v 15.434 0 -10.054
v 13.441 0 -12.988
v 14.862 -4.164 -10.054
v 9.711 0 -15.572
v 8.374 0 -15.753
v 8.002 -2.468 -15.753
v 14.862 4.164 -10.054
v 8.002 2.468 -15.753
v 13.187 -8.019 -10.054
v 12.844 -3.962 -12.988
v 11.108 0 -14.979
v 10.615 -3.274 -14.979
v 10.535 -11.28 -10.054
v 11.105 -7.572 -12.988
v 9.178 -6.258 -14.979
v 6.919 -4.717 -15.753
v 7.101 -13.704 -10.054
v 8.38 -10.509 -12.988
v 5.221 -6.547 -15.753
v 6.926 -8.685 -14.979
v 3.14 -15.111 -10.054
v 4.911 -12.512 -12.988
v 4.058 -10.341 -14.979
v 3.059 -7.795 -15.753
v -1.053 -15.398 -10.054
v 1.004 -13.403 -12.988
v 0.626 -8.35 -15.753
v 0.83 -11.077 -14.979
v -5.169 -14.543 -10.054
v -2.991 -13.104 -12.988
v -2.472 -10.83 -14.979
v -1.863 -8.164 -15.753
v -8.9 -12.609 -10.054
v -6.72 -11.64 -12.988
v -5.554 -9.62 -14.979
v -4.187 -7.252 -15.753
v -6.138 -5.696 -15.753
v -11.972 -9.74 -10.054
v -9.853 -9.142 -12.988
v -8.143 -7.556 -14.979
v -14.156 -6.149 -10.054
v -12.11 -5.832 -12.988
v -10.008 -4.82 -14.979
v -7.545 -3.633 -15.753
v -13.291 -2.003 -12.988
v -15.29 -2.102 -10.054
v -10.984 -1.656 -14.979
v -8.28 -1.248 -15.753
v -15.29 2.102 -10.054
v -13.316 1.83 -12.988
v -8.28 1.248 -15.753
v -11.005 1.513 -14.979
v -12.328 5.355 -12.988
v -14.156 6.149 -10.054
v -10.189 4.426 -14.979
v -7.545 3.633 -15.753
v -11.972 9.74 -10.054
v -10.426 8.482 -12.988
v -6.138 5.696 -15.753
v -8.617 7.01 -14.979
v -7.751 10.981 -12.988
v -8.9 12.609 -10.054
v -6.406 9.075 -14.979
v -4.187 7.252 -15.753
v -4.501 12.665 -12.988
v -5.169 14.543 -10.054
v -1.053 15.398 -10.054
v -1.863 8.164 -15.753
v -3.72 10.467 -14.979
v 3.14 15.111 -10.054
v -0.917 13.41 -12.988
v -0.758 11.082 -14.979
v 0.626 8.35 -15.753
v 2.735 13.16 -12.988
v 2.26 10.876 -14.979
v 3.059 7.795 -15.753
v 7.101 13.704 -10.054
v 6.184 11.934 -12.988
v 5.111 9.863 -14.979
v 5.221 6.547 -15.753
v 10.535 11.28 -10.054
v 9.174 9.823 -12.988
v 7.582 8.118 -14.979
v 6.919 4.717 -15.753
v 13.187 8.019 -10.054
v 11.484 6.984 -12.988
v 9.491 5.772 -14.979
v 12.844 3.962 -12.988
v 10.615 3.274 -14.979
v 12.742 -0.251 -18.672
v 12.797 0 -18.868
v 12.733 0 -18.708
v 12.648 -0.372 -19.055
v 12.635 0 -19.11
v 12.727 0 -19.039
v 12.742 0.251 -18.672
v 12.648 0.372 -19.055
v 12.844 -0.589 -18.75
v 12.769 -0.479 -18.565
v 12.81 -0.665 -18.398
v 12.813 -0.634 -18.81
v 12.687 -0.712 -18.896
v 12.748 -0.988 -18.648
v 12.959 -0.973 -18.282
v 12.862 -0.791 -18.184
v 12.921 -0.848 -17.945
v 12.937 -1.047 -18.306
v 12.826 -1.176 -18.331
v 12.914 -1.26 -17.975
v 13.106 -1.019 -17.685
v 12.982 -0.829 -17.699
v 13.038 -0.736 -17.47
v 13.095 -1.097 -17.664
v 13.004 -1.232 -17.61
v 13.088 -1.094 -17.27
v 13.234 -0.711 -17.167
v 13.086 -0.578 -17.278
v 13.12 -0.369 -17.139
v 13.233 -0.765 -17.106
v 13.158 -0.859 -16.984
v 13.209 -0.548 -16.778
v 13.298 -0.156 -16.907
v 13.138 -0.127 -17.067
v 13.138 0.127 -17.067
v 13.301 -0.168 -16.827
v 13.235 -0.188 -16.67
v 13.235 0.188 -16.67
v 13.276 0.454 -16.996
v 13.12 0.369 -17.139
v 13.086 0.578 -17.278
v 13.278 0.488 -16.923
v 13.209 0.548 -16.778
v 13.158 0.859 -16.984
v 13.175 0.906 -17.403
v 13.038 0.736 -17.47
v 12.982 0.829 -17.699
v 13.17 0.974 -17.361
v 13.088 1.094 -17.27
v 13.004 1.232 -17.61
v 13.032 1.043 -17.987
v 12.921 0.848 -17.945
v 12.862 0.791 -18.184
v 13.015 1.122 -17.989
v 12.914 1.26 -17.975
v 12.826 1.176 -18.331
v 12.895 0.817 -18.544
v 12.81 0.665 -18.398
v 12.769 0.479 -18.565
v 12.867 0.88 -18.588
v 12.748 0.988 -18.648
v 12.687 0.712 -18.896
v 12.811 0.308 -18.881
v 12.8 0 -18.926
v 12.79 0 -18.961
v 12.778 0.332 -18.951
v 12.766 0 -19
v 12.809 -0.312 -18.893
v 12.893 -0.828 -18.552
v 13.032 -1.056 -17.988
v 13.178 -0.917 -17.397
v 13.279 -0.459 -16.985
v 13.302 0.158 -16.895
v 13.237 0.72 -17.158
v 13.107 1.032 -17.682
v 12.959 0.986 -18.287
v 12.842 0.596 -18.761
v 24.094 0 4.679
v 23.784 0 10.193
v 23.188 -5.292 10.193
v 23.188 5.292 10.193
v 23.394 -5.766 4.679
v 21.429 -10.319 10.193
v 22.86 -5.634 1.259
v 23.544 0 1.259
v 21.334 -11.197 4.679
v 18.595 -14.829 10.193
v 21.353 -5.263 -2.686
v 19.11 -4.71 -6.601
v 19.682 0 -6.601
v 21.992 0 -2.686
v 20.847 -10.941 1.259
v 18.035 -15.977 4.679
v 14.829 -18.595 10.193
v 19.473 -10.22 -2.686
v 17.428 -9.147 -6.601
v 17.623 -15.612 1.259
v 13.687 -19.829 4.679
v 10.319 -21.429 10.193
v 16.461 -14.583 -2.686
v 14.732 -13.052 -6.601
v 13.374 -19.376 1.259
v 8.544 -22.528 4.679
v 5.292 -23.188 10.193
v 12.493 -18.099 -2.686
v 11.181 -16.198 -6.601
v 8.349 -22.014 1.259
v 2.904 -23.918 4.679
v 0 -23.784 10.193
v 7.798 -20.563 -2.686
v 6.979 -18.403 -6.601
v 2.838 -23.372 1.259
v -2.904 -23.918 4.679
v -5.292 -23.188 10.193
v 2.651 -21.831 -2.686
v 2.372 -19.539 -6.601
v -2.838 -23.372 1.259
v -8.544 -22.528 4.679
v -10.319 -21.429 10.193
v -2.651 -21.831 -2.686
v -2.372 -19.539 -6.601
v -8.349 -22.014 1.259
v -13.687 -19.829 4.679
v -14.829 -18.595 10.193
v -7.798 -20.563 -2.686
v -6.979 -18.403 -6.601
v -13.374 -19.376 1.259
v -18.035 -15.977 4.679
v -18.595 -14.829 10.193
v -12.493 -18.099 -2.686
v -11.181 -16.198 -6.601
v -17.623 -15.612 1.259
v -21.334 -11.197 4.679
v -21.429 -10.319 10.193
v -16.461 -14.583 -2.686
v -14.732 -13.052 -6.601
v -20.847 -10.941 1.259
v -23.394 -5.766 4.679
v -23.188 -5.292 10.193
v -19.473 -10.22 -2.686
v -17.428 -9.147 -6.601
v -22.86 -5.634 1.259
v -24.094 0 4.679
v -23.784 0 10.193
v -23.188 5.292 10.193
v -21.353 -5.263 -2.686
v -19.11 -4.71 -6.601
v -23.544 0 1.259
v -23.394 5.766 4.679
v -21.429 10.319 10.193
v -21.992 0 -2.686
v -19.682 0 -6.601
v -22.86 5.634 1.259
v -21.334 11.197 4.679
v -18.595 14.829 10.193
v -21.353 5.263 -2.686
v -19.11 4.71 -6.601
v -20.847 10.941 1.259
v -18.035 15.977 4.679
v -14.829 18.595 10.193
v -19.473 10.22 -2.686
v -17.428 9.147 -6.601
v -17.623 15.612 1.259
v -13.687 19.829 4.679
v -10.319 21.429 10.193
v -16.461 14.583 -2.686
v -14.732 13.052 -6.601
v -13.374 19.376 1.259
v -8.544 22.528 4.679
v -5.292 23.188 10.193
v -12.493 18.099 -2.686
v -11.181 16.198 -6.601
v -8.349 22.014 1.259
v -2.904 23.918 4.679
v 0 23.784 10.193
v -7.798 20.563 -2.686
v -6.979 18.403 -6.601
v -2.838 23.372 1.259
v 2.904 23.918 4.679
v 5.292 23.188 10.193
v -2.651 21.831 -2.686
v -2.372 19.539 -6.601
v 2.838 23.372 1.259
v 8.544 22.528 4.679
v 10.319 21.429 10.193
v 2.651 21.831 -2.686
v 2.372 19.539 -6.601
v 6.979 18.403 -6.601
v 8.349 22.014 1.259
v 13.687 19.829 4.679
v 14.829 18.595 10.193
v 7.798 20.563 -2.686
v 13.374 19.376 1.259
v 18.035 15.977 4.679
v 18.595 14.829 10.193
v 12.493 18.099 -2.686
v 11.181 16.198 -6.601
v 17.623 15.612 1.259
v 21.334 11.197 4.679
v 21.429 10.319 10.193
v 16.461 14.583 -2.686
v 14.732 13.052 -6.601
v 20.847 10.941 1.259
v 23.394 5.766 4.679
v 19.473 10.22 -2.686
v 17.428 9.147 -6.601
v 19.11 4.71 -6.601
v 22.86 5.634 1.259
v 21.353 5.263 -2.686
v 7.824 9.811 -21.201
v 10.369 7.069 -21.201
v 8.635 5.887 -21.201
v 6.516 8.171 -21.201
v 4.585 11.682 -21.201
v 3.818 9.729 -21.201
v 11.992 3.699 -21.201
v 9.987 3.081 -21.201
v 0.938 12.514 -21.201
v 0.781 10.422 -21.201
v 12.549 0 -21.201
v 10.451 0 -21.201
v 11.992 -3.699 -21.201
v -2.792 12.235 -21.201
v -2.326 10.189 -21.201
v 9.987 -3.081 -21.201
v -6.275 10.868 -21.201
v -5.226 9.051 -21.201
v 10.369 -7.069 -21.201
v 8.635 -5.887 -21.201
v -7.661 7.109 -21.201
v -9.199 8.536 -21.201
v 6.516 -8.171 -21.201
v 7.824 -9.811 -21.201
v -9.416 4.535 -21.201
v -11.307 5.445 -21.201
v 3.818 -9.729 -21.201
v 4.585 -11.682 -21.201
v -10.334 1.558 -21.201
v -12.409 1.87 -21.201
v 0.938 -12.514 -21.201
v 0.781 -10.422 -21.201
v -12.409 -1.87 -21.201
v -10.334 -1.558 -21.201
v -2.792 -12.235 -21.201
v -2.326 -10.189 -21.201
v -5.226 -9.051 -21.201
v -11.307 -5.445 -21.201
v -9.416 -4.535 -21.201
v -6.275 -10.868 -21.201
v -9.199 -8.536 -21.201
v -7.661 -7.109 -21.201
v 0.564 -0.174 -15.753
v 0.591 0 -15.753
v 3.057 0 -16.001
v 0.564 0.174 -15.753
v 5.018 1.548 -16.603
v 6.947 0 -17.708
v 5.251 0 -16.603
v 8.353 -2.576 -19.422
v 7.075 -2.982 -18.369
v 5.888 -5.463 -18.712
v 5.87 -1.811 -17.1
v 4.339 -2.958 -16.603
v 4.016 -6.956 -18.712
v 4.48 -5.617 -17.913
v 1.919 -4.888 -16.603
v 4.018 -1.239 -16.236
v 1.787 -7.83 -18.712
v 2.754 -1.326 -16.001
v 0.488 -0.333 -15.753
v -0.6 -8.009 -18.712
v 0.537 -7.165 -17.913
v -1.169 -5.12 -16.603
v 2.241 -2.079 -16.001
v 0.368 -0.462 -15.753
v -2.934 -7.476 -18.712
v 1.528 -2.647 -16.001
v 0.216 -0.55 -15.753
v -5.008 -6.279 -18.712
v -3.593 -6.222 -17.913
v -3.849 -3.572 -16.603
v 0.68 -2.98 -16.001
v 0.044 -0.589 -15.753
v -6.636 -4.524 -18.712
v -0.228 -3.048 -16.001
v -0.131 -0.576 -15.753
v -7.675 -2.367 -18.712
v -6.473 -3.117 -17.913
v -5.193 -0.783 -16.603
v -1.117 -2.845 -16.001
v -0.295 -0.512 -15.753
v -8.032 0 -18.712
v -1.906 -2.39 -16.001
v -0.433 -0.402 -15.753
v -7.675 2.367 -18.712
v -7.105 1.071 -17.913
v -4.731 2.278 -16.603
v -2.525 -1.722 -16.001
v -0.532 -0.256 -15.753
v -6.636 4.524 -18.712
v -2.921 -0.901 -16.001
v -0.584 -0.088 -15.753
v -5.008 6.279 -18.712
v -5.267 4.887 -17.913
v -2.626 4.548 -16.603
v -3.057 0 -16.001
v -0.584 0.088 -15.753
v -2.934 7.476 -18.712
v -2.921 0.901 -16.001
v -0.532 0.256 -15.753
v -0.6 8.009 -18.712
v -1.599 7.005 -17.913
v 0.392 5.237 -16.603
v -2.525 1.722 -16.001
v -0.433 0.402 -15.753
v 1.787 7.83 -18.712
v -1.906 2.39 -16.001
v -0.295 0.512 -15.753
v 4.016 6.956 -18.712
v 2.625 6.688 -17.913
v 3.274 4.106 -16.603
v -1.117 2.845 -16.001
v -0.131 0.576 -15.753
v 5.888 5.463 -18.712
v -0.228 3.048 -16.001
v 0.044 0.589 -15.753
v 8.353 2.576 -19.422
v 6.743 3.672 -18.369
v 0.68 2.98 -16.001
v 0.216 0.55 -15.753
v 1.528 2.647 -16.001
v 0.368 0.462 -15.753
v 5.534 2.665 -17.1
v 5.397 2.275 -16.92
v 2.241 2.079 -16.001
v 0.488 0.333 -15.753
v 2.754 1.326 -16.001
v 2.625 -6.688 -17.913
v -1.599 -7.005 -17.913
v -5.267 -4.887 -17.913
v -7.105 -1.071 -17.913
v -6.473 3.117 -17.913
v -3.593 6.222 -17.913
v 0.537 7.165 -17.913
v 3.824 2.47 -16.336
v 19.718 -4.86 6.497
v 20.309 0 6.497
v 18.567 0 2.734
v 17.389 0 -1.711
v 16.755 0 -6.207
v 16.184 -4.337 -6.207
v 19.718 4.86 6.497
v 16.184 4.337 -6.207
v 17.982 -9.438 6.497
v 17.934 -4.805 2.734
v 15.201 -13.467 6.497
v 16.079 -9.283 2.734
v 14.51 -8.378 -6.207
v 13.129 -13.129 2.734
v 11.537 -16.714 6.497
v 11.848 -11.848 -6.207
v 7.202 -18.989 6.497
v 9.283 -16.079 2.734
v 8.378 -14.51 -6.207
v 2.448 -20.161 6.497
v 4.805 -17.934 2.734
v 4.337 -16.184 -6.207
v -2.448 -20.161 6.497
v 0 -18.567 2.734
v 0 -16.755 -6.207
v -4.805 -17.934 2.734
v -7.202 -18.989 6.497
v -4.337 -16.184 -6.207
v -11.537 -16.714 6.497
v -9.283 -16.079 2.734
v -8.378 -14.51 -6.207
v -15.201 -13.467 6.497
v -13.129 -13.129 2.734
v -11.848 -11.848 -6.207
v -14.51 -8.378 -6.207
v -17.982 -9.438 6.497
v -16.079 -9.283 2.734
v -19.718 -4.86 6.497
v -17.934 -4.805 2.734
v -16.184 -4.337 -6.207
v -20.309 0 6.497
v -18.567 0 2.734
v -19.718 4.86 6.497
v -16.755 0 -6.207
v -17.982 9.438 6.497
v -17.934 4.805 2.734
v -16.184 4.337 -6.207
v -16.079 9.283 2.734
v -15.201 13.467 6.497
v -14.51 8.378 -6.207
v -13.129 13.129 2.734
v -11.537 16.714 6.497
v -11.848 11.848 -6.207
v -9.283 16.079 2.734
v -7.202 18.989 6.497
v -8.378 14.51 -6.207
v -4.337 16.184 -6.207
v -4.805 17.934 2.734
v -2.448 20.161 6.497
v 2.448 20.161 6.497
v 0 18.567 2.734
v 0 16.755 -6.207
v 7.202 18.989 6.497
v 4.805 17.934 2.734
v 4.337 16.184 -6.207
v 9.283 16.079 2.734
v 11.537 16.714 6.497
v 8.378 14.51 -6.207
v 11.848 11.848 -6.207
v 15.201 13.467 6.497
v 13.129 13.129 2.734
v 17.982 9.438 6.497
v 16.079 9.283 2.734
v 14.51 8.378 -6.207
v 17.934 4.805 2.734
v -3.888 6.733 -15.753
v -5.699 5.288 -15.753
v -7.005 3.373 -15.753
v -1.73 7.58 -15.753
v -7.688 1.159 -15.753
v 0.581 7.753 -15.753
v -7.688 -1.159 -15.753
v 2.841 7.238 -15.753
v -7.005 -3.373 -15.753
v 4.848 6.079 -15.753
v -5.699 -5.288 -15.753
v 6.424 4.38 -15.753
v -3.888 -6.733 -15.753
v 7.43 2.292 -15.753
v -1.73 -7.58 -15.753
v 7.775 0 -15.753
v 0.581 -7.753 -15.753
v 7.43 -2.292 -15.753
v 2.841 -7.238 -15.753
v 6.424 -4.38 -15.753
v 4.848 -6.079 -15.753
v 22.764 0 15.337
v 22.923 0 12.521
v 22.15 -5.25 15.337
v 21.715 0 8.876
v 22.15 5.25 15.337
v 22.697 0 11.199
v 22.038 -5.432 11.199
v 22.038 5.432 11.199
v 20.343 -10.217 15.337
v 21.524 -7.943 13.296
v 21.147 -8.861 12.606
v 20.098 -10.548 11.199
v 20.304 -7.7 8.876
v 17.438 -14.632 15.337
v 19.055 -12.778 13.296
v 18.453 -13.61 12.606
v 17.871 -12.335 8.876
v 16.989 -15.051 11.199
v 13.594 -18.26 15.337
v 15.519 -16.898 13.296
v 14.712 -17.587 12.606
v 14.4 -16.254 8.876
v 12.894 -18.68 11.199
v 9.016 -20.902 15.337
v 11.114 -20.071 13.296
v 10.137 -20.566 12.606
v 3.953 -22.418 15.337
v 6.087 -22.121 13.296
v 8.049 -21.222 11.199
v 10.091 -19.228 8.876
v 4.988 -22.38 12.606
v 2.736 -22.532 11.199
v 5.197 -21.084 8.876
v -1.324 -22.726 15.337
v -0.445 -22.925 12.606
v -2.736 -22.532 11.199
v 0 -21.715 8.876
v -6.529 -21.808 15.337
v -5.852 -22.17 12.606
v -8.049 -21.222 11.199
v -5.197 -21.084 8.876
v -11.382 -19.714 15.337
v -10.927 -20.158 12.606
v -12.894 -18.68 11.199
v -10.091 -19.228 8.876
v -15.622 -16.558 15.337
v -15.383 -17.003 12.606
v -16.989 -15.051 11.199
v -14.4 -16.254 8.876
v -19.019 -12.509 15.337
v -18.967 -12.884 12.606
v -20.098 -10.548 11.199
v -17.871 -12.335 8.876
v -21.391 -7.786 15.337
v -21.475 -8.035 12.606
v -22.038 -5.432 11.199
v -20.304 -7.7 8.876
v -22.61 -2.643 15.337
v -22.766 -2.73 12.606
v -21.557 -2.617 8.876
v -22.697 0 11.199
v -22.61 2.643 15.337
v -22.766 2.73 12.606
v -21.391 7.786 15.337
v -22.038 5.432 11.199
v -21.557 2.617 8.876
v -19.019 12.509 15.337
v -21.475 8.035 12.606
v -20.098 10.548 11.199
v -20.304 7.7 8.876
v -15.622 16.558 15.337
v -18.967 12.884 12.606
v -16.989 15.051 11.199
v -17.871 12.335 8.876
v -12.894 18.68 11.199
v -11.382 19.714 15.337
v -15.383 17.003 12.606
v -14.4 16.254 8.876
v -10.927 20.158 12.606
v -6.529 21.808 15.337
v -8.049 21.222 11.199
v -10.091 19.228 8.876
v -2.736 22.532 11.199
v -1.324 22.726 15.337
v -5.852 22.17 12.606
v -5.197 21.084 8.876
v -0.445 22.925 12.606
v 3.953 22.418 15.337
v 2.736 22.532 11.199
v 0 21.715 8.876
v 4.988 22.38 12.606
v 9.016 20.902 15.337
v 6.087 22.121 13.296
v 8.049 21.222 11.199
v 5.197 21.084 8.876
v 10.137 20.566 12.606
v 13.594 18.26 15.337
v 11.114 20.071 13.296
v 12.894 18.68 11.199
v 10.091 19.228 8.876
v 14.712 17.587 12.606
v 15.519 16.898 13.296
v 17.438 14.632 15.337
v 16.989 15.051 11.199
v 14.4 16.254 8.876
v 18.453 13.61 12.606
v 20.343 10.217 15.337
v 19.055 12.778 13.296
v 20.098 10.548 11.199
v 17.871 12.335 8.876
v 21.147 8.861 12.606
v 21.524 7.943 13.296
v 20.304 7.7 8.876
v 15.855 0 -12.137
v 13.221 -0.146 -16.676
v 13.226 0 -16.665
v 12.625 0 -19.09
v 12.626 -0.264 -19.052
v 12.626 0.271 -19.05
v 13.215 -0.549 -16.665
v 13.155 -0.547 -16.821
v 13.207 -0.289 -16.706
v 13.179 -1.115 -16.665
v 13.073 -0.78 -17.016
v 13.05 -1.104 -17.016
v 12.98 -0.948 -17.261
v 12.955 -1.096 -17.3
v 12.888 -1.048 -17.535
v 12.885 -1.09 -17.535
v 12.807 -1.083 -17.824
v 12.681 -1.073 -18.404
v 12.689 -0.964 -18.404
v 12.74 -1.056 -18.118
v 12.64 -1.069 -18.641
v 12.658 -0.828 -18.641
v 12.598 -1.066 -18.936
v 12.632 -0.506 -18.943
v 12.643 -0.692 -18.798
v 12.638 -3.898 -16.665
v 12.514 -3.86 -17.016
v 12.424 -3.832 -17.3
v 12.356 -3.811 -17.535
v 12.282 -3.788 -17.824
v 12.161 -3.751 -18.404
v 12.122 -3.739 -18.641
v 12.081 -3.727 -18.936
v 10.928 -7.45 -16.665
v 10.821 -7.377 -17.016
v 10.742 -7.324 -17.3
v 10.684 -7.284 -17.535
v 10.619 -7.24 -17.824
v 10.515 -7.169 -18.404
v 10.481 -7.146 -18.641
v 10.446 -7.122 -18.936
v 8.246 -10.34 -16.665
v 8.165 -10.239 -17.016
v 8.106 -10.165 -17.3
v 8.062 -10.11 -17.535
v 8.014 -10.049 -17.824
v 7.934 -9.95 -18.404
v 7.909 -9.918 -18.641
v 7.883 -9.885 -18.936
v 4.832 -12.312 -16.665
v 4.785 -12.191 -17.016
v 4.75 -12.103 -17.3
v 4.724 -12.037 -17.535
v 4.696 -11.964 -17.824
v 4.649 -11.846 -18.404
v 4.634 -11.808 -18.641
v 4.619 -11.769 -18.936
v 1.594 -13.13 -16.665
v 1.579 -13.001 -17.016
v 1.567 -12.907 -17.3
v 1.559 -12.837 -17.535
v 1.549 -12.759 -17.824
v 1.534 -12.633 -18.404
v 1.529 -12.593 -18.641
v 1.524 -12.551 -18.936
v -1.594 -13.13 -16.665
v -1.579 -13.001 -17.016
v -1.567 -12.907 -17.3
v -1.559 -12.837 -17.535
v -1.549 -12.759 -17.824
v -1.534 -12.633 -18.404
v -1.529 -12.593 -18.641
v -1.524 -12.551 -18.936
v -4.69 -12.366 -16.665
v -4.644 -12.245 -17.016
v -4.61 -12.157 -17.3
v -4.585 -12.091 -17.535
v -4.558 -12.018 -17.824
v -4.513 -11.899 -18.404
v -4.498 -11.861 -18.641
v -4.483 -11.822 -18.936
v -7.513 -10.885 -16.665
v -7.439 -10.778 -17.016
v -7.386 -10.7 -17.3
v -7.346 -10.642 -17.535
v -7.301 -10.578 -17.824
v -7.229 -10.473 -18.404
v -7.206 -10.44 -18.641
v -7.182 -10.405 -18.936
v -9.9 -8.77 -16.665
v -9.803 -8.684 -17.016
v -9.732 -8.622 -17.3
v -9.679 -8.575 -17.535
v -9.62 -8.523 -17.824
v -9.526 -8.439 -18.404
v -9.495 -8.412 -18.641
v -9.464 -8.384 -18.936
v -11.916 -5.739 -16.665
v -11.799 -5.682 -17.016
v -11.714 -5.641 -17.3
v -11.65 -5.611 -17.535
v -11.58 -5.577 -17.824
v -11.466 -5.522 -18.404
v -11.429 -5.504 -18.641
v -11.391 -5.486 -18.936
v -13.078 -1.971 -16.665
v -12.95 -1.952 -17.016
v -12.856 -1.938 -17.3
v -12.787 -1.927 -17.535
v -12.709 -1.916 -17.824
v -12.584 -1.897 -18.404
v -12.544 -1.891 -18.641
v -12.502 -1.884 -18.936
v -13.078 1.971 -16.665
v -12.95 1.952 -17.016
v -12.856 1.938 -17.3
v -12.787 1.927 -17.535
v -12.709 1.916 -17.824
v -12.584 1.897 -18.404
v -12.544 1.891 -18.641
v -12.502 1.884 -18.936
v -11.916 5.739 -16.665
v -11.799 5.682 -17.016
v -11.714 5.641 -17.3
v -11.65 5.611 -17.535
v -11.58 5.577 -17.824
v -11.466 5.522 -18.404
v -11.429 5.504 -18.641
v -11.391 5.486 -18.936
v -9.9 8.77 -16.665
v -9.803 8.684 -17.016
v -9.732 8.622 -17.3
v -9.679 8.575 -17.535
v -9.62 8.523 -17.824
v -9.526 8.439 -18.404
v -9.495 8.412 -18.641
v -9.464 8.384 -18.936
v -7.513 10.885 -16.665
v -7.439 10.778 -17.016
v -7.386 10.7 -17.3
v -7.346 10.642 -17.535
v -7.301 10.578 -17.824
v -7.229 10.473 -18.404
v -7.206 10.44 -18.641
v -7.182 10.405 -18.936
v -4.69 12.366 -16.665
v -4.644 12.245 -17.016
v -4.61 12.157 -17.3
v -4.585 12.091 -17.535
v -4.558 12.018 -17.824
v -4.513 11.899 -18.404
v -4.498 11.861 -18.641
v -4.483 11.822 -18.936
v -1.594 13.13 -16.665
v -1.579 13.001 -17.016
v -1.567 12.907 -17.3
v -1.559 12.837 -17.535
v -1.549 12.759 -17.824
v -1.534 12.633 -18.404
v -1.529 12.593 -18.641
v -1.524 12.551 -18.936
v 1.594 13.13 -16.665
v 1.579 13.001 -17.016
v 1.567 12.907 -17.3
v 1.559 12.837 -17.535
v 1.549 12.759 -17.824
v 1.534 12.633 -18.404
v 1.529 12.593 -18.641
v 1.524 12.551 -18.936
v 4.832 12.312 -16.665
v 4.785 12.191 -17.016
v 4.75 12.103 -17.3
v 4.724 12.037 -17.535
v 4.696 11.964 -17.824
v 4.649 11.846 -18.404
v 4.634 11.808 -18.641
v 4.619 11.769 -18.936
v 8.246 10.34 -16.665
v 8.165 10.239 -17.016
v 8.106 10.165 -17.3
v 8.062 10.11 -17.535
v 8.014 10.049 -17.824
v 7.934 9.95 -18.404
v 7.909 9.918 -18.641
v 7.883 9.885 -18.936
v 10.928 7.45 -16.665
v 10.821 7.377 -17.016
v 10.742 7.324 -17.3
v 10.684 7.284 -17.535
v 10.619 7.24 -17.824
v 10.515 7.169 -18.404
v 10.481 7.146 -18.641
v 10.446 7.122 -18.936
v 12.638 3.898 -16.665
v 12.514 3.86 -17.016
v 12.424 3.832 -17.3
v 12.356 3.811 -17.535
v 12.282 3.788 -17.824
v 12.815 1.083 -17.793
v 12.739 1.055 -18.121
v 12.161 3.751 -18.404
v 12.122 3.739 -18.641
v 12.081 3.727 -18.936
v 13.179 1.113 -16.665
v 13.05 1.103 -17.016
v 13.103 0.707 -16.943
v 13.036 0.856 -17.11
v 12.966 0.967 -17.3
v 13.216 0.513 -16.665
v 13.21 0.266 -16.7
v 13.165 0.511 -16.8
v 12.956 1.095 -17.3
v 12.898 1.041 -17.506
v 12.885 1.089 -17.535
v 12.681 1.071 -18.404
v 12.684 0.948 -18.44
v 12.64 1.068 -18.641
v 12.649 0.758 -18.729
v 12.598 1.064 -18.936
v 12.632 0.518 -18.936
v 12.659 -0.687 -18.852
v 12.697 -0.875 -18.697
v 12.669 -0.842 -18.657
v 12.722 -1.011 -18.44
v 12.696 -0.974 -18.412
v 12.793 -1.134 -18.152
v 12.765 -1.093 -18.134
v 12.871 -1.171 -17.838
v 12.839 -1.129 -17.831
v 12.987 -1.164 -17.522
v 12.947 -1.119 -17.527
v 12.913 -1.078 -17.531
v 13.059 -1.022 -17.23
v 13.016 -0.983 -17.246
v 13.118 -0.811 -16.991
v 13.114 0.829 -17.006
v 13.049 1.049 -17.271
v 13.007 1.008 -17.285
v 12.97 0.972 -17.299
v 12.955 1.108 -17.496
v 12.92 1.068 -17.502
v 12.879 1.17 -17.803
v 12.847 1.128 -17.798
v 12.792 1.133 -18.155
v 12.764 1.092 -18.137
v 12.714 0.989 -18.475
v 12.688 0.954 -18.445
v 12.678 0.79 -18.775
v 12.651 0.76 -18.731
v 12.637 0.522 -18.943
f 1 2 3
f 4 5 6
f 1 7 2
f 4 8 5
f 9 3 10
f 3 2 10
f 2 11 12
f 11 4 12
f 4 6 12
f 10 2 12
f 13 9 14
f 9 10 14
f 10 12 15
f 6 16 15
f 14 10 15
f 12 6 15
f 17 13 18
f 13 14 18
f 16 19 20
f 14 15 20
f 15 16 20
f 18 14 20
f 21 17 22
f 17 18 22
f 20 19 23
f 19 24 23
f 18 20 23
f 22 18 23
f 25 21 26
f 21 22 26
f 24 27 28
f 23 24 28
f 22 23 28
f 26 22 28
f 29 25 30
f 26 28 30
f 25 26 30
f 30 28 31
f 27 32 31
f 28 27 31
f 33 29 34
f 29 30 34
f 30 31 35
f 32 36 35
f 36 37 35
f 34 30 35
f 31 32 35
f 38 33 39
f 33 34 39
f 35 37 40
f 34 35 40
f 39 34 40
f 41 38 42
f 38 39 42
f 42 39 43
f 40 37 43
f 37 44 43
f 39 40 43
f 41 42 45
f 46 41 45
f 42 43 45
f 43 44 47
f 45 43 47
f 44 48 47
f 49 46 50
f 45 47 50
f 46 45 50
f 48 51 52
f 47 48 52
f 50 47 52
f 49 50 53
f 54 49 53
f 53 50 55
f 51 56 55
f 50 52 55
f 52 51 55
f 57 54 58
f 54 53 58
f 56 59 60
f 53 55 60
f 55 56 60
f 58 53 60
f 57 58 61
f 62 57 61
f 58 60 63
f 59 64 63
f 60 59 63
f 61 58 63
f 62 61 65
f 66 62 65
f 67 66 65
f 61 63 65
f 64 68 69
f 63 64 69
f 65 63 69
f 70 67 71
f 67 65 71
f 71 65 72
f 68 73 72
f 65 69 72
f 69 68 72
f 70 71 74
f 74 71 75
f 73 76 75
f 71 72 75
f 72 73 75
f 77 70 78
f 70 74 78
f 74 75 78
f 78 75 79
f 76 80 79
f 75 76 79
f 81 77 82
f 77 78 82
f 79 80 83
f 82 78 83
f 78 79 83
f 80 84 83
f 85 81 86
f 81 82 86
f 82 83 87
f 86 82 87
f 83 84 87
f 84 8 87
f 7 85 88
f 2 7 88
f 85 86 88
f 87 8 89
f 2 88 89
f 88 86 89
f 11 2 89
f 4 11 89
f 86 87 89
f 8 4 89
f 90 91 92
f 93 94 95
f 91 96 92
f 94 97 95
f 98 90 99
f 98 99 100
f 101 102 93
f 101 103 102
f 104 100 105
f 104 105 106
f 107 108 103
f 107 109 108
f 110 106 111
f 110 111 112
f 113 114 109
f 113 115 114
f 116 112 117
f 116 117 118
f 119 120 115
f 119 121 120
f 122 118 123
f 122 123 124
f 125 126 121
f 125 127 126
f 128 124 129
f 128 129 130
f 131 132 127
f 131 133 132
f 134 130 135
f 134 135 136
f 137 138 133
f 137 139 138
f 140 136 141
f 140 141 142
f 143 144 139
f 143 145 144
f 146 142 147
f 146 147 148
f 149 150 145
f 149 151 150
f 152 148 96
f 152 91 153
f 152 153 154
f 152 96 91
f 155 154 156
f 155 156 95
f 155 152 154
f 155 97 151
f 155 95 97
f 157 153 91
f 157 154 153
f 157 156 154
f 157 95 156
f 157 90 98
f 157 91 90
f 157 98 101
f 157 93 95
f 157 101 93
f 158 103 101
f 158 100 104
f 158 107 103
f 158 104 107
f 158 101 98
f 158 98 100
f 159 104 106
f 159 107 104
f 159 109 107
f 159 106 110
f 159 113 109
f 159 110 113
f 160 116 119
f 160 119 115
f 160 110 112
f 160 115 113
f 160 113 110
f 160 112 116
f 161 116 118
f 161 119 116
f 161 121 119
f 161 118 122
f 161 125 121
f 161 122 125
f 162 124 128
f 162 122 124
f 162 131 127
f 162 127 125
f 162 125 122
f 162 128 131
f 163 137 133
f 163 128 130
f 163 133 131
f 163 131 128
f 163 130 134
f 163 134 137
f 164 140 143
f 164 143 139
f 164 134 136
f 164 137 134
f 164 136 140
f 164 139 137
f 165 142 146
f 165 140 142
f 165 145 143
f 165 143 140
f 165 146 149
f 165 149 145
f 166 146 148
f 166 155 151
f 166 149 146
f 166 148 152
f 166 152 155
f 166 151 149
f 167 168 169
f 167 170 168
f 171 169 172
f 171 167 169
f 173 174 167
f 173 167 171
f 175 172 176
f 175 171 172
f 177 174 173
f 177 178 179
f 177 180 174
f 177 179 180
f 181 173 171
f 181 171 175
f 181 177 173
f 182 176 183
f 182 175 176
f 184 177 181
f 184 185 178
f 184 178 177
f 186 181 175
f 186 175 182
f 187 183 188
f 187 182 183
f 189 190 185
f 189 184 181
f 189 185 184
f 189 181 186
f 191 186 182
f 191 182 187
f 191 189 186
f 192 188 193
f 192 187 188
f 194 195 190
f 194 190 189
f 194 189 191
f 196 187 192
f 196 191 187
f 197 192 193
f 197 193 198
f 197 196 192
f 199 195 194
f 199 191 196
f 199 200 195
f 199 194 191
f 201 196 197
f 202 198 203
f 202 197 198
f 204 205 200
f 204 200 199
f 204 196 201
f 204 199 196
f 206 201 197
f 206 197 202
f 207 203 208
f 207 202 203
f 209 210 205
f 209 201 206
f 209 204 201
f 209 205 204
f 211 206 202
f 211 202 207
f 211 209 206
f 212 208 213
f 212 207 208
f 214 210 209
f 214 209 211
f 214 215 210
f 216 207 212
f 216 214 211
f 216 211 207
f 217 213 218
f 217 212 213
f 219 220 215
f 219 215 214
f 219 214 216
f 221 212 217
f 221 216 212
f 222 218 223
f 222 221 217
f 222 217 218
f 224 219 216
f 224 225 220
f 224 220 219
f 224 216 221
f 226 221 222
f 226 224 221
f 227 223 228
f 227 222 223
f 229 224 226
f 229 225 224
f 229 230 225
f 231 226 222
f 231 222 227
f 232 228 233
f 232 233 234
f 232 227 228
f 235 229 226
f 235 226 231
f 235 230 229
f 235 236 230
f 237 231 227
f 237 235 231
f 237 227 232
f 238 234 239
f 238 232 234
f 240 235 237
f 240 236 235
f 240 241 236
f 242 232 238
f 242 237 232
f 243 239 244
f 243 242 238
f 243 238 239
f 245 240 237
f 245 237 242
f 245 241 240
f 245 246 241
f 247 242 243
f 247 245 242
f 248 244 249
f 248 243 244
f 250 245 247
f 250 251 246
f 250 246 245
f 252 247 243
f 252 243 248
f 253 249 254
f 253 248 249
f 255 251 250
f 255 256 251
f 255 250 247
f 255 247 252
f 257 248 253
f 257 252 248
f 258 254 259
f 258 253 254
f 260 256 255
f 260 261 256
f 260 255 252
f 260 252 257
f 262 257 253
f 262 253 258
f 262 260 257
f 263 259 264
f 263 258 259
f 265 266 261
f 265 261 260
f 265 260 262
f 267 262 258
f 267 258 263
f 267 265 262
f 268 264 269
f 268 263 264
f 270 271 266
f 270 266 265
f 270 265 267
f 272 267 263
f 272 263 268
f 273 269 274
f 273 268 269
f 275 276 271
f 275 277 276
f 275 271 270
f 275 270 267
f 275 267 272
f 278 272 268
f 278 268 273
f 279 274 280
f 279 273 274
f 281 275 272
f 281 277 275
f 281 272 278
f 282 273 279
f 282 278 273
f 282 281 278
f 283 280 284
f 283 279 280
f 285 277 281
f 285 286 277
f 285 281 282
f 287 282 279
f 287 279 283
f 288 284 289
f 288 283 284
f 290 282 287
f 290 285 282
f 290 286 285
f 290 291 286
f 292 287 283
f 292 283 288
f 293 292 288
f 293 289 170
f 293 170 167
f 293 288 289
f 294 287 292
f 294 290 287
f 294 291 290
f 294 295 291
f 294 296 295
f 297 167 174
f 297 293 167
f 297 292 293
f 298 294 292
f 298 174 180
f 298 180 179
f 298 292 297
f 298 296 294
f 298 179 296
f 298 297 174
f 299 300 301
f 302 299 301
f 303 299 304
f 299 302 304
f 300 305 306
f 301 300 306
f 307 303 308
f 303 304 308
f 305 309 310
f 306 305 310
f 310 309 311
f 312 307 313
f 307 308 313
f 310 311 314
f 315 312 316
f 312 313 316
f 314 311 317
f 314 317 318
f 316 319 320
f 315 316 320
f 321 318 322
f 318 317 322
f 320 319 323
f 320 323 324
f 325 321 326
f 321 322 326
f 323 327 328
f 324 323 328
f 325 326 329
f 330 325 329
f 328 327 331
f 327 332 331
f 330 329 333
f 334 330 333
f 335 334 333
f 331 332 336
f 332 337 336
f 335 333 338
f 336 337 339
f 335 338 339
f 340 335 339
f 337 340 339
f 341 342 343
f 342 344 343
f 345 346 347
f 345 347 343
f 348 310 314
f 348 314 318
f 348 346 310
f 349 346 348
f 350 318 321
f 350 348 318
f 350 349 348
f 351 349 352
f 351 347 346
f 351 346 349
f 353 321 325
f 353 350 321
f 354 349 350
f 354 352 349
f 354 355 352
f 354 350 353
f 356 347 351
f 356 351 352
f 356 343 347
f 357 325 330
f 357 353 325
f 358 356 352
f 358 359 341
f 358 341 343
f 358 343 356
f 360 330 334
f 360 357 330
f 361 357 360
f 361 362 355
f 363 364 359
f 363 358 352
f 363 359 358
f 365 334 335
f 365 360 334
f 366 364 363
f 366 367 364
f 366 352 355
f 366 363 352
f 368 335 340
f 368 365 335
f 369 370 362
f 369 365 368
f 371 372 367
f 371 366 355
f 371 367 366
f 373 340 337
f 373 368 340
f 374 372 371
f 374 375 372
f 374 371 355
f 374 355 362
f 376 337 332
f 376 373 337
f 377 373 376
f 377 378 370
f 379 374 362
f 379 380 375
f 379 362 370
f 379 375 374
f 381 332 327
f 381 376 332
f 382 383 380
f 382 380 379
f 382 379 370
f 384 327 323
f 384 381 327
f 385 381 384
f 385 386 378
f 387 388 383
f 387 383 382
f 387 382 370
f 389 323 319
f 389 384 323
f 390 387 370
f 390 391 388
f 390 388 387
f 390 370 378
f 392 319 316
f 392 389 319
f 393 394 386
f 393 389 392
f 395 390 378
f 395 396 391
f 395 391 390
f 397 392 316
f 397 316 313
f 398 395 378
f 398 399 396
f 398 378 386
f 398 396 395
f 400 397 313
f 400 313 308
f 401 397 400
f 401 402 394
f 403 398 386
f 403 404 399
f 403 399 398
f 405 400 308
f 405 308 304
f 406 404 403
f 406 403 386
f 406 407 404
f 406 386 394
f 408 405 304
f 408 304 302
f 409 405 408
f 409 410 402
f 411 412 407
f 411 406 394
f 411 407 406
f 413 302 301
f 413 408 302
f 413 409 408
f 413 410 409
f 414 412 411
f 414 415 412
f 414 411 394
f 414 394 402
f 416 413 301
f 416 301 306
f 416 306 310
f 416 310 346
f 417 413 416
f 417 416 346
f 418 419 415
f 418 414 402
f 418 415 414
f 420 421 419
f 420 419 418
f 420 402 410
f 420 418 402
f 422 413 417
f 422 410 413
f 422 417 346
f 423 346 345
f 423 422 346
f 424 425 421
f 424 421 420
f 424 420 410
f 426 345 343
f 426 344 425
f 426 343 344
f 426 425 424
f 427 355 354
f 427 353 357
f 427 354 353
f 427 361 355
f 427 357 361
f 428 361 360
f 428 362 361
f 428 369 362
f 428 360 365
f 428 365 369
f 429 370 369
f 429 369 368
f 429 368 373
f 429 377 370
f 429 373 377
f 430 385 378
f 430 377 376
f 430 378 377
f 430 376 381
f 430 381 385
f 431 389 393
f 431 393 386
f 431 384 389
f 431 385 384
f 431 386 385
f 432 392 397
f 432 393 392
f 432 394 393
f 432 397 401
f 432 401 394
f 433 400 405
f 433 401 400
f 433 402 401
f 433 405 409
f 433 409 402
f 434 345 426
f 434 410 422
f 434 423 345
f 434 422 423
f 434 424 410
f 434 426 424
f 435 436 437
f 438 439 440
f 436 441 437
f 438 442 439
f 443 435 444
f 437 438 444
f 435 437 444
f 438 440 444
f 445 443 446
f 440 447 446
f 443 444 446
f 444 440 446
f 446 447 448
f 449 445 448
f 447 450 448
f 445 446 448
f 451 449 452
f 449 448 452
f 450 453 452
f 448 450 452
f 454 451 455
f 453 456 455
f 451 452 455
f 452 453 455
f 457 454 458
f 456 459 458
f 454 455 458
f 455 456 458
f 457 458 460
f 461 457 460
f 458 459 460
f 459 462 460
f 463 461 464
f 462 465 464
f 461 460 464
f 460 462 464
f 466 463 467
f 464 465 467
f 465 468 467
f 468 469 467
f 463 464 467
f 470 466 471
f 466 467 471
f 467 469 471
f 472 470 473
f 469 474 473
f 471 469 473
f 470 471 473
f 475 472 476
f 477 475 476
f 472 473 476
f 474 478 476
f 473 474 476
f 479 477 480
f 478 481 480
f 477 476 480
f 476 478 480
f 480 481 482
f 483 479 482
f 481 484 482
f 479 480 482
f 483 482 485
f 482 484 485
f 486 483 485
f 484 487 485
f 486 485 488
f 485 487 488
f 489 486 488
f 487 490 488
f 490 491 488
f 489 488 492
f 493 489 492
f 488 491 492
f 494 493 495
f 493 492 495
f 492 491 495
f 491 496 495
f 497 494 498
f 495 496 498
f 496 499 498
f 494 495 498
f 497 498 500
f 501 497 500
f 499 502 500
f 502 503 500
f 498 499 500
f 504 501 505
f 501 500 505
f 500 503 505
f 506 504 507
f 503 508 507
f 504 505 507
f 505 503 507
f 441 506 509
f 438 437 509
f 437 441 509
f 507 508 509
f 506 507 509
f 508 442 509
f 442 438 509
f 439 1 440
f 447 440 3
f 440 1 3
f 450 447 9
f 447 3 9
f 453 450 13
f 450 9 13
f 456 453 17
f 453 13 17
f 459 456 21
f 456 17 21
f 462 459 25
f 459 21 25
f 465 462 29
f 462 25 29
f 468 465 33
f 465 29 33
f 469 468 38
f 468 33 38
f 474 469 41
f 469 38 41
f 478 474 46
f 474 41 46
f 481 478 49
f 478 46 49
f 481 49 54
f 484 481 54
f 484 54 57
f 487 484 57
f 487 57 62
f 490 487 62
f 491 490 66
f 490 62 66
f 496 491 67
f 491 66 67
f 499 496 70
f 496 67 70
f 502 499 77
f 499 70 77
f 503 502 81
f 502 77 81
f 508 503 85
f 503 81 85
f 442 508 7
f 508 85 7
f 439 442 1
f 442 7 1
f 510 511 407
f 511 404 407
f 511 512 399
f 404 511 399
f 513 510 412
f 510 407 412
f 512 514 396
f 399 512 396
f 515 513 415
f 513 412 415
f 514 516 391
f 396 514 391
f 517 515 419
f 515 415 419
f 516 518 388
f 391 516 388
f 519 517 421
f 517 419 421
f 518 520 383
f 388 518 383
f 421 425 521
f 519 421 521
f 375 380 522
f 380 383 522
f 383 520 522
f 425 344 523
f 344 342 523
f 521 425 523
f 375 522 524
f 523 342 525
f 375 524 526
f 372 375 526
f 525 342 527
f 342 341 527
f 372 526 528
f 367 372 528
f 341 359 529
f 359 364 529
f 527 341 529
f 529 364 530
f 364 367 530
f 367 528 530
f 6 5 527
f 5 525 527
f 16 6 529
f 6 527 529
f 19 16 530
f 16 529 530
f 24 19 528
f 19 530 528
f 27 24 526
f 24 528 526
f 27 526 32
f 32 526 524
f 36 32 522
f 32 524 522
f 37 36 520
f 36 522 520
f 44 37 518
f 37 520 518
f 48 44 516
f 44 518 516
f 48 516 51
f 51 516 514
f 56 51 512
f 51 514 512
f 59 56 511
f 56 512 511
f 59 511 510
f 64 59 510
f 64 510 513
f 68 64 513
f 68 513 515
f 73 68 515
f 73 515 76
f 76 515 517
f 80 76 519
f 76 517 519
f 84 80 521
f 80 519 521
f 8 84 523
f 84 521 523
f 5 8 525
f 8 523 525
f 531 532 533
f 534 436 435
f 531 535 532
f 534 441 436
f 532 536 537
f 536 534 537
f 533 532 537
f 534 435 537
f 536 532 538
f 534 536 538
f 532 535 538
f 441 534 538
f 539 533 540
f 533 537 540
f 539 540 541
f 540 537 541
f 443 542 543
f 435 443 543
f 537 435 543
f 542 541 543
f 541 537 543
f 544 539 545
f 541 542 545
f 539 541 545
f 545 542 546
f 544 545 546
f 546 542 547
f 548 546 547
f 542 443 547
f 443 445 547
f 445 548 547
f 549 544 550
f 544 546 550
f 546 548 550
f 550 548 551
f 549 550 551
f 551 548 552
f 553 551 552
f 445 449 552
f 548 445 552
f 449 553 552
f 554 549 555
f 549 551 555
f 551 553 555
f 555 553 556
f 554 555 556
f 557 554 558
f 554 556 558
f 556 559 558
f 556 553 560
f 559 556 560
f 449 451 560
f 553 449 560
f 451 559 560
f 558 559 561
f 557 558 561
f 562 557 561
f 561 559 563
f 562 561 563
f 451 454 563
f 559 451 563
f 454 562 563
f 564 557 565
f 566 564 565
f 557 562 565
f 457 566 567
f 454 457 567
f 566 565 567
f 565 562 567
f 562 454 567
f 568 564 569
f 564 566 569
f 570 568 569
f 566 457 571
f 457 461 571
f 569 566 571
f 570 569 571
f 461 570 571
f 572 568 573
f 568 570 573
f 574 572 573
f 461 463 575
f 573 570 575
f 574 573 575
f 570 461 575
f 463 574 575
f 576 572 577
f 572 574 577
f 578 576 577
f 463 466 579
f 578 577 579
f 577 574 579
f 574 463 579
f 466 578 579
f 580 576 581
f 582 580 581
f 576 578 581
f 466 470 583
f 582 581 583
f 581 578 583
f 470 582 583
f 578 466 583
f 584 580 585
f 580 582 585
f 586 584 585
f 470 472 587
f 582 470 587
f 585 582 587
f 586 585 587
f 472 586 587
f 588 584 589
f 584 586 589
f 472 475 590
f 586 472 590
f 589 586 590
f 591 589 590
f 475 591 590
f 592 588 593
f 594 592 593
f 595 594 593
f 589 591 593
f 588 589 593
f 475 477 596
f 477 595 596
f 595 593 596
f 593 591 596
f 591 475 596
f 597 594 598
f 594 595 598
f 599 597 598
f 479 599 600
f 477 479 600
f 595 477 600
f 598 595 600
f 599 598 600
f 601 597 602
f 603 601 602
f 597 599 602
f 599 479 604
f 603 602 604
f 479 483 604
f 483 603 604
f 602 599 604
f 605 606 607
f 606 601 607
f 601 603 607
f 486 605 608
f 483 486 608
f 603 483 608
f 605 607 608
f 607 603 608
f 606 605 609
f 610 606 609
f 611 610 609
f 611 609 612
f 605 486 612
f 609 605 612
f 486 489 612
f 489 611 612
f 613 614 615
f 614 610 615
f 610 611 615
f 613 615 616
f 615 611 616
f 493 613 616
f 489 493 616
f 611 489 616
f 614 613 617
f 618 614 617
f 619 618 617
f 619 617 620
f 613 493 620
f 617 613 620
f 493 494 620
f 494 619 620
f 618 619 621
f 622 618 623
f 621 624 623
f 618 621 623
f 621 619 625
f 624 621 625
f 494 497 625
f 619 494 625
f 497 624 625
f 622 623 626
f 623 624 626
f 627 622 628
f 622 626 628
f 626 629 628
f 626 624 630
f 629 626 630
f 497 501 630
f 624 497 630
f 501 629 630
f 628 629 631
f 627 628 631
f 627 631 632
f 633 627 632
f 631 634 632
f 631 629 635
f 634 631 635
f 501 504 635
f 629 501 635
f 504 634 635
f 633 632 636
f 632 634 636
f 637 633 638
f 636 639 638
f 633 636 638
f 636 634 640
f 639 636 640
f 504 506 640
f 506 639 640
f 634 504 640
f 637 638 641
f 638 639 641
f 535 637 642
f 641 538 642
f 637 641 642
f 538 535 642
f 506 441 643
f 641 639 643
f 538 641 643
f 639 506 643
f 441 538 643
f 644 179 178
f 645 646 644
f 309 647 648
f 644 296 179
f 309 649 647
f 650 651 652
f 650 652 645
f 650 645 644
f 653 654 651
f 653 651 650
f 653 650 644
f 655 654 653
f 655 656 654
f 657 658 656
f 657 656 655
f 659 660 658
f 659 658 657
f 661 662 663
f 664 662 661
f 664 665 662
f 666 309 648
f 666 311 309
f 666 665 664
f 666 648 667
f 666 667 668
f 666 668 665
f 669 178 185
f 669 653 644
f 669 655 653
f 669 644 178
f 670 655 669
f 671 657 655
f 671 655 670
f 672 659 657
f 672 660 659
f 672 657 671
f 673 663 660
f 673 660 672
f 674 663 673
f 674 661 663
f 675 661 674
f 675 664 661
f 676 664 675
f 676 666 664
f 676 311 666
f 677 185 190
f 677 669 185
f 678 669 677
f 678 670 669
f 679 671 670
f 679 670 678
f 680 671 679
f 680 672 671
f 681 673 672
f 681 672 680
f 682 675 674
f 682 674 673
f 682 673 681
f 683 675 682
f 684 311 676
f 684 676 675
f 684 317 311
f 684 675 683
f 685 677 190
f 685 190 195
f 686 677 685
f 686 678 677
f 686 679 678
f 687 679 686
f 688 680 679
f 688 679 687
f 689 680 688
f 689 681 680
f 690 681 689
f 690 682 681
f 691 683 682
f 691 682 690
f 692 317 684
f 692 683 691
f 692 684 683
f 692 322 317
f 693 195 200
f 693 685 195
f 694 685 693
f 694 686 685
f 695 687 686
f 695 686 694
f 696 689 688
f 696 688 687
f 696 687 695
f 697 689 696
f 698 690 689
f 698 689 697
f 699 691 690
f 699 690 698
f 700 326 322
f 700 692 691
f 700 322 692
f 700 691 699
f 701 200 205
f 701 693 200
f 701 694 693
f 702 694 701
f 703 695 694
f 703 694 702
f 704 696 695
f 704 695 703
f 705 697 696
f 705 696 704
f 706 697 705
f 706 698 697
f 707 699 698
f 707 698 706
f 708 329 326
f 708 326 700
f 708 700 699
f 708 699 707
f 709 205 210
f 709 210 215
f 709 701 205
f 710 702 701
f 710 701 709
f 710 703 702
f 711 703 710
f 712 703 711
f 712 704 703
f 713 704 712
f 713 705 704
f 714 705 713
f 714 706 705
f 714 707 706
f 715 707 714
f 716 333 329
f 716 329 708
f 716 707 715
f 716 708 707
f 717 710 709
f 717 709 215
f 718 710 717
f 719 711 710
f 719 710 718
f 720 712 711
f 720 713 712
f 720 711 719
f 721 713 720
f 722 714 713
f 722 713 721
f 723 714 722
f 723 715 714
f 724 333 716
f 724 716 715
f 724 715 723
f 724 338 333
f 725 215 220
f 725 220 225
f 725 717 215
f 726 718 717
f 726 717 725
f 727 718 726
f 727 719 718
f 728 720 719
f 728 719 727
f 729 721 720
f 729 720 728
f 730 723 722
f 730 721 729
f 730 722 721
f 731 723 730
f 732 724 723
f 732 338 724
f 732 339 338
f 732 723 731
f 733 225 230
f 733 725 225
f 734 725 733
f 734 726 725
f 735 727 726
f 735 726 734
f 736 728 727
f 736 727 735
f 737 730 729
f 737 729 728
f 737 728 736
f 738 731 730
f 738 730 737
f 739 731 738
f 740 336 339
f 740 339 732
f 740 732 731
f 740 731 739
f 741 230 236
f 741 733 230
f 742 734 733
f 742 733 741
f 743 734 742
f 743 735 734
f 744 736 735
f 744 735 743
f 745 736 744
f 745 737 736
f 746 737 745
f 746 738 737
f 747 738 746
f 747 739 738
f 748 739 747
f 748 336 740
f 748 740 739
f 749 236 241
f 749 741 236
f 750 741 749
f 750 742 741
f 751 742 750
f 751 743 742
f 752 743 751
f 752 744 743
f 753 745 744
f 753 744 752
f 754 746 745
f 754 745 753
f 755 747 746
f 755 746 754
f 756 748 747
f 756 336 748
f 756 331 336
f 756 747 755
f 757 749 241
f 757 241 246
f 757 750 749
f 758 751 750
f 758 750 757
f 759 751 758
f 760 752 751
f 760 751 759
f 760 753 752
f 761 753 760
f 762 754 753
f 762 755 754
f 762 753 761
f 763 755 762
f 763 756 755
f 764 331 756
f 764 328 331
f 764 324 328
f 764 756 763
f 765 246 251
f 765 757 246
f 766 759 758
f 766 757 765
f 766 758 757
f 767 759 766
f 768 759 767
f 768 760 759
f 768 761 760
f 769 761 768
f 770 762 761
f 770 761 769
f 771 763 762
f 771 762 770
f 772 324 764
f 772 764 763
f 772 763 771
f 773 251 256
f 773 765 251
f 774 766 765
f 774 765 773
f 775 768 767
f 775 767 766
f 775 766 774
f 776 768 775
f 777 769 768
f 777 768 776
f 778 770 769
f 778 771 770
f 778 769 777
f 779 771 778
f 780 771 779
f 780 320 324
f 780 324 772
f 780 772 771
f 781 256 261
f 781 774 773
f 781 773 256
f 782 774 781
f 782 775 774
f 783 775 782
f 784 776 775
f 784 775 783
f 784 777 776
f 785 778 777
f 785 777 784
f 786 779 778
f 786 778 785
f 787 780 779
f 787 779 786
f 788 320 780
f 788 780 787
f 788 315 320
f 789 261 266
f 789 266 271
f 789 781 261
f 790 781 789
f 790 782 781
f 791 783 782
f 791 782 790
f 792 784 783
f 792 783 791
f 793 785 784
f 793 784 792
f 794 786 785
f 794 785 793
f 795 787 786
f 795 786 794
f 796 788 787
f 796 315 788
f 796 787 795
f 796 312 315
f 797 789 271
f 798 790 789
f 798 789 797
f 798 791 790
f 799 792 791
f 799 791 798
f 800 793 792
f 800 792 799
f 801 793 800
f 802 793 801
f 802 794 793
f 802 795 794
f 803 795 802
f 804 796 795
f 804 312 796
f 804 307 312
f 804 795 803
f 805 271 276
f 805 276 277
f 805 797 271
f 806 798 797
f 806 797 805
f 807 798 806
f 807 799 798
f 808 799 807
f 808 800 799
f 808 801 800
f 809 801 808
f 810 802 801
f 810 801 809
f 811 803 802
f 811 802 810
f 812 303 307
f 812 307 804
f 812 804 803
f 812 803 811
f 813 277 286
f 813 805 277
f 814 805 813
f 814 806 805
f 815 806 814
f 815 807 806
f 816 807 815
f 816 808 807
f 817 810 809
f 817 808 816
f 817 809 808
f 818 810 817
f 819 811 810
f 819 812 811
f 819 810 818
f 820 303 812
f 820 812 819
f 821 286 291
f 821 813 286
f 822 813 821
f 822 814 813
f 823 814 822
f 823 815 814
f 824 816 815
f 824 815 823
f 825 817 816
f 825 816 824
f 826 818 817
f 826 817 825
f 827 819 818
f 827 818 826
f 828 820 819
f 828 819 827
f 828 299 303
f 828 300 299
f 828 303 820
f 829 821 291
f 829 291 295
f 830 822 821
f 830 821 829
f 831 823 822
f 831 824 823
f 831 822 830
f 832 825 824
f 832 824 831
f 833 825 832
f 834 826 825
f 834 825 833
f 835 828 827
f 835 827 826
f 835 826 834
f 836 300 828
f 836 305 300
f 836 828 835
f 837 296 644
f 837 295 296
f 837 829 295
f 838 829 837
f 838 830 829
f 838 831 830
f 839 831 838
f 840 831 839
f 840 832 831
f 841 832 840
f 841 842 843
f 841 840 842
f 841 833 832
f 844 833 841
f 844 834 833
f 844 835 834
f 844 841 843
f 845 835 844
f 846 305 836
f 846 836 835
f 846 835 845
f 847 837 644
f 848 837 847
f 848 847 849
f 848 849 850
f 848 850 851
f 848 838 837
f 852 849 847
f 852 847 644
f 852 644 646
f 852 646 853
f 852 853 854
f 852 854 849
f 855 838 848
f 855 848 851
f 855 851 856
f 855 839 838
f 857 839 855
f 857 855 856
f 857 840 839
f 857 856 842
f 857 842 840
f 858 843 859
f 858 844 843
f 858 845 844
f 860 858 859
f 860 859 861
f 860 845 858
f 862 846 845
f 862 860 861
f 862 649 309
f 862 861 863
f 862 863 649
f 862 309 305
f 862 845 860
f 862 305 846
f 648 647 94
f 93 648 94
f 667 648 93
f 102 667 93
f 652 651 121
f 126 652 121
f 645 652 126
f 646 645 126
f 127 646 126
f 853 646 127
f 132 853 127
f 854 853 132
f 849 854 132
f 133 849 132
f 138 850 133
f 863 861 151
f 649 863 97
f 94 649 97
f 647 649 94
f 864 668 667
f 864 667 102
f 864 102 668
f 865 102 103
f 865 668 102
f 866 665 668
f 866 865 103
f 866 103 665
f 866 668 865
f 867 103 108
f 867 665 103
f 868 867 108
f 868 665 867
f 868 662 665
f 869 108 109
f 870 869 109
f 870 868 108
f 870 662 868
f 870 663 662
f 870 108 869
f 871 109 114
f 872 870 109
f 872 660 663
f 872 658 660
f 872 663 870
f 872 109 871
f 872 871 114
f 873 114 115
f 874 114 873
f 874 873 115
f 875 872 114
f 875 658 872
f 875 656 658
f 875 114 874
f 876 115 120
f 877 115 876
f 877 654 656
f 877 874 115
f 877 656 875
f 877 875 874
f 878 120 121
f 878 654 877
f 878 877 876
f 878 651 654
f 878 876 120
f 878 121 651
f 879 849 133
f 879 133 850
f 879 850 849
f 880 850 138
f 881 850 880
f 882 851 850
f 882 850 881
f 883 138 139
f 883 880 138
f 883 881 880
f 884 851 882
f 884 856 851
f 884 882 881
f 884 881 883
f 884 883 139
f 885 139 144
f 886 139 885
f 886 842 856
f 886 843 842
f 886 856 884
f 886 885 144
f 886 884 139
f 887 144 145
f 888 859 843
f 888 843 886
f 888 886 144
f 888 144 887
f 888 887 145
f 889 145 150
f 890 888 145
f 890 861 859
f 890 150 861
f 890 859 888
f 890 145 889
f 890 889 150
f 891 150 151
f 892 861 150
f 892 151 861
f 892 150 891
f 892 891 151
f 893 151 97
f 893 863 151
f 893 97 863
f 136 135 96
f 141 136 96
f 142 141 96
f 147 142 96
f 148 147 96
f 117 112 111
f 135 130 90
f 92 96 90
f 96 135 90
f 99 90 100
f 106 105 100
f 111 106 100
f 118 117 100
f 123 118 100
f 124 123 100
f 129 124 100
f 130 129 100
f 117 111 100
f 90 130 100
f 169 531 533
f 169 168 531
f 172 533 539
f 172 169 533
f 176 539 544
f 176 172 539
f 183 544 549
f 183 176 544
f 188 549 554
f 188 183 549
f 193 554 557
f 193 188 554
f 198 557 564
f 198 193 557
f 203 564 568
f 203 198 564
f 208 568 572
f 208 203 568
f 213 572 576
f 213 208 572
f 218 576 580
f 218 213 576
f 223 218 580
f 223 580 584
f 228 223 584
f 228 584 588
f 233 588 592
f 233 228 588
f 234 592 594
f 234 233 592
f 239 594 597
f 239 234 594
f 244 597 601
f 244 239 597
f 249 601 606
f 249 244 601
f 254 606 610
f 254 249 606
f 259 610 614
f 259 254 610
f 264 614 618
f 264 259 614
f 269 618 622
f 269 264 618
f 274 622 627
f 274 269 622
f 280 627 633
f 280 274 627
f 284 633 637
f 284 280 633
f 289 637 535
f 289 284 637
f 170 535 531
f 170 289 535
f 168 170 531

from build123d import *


with BuildPart() as f1:
    # F0 (on Front) → F1 (revolve)
    with BuildSketch(Plane.XZ):
        with BuildLine():
            add(Edge.make_bspline(
                [(19.6823217034, -6.6014872209), (18.7206290933, -7.4863491309), (17.5676079465, -8.5412161557), (16.6606779031, -9.2215613008), (16.5172192351, -9.3254513944)],
                knots=[0, 0, 0, 0, 0.5821747808, 0.6959078834, 0.6959078834, 0.6959078834, 0.6959078834], degree=3))
            add(Edge.make_bspline(
                [(23.7838823749, 10.1932772593), (24.2970848929, 6.840613956), (24.4178453084, 1.3242383799), (21.093212182, -4.4477596725), (19.6823217034, -6.6014872209)],
                knots=[0.1255407693, 0.1255407693, 0.1255407693, 0.1255407693, 0.3707684145, 0.5266538311, 0.5266538311, 0.5266538311, 0.5266538311], degree=3))
            add(Edge.make_bspline(
                [(23.7838823557, 10.1932772629), (22.5530164904, 9.153802728), (21.3274805944, 8.1001474), (20.3086007386, 6.497125607)],
                knots=[0.0071128484, 0.0071128484, 0.0071128484, 0.0071128484, 0.27405021, 0.27405021, 0.27405021, 0.27405021], degree=3))
            add(Edge.make_bspline(
                [(20.3086007386, 6.497125607), (18.9438893572, 4.3500009258), (17.4757524028, -0.2772106808), (16.8935087075, -4.7649402342), (16.755240937, -6.2066463042)],
                knots=[0.27405021, 0.27405021, 0.27405021, 0.27405021, 0.6315923221, 0.8021612393, 0.8021612393, 0.8021612393, 0.8021612393], degree=3))
            add(Edge.make_bspline(
                [(16.755240937, -6.2066463042), (16.6552314343, -7.2494367288), (16.5812677523, -8.2881791115), (16.5172192351, -9.3254513944)],
                knots=[0.8021612393, 0.8021612393, 0.8021612393, 0.8021612393, 0.9255342605, 0.9255342605, 0.9255342605, 0.9255342605], degree=3))
        make_face()
        with BuildLine():
            add(Edge.make_bspline(
                [(19.6823217034, -6.6014872209), (17.4171980587, -10.0592036547), (12.5537292031, -16.1629021911), (12.5385838339, -19.5460692495), (12.5492885709, -21.20067738)],
                knots=[0.5266538311, 0.5266538311, 0.5266538311, 0.5266538311, 0.7769211256, 1, 1, 1, 1], degree=3))
            add(Edge.make_bspline(
                [(19.6823217034, -6.6014872209), (18.7206290933, -7.4863491309), (17.5676079465, -8.5412161557), (16.6606779031, -9.2215613008), (16.5172192351, -9.3254513944)],
                knots=[0, 0, 0, 0, 0.5821747808, 0.6959078834, 0.6959078834, 0.6959078834, 0.6959078834], degree=3))
            add(Edge.make_bspline(
                [(16.5172192351, -9.3254513944), (16.1336488497, -9.6032259185), (15.7841216901, -9.8288168601), (15.4340223068, -10.0539055119)],
                knots=[0.6959078834, 0.6959078834, 0.6959078834, 0.6959078834, 1, 1, 1, 1], degree=3))
            add(Edge.make_bspline(
                [(15.4340223068, -10.0539055119), (15.2801119472, -10.3720102908), (14.1971702129, -12.3893155375), (11.3362161193, -15.3503692976), (9.1659848619, -15.7282313026), (8.3738614299, -15.7529823482)],
                knots=[0.281908143, 0.281908143, 0.281908143, 0.281908143, 0.3519178239, 0.7265638945, 0.9449180046, 0.9449180046, 0.9449180046, 0.9449180046], degree=3))
            add(Edge.make_bspline(
                [(8.3738614299, -15.7529823482), (8.1740404178, -15.7592260456), (7.9746646983, -15.7581908421), (7.7750007622, -15.7529823482)],
                knots=[0.9449180046, 0.9449180046, 0.9449180046, 0.9449180046, 1, 1, 1, 1], degree=3))
            Line((7.7750007622, -15.7529823482), (0.5906730657, -15.7529823482))
            add(Edge.make_bspline(
                [(10.4511072859, -21.20067738), (9.6412763004, -20.3488201147), (8.0167557876, -18.6399949078), (5.2456073558, -16.1032388951), (2.2052839685, -15.8744723638), (0.5906730657, -15.7529823482)],
                knots=[0, 0, 0, 0, 0.3179359251, 0.6377792914, 1, 1, 1, 1], degree=3))
            Line((10.4511072859, -21.20067738), (12.5492885709, -21.20067738))
        make_face()
        with BuildLine():
            add(Edge.make_bspline(
                [(23.7838823557, 10.1932772629), (22.5530164904, 9.153802728), (21.3274805944, 8.1001474), (20.3086007386, 6.497125607)],
                knots=[0.0071128484, 0.0071128484, 0.0071128484, 0.0071128484, 0.27405021, 0.27405021, 0.27405021, 0.27405021], degree=3))
            add(Edge.make_bspline(
                [(22.7640811354, 15.3368497267), (23.1432789035, 13.6207649594), (23.5211557201, 11.9096250621), (23.7838823749, 10.1932772593)],
                knots=[0, 0, 0, 0, 0.1255407693, 0.1255407693, 0.1255407693, 0.1255407693], degree=3))
            add(Edge.make_bspline(
                [(22.7640811354, 15.3368497267), (22.9201033117, 14.065351127), (23.2625710046, 11.2744197209), (21.3498954205, 8.1811543908), (20.3086007386, 6.497125607)],
                knots=[0, 0, 0, 0, 0.4555821748, 1, 1, 1, 1], degree=3))
        make_face()
        with BuildLine():
            add(Edge.make_bspline(
                [(16.5172192351, -9.3254513944), (16.1336488497, -9.6032259185), (15.7841216901, -9.8288168601), (15.4340223068, -10.0539055119)],
                knots=[0.6959078834, 0.6959078834, 0.6959078834, 0.6959078834, 1, 1, 1, 1], degree=3))
            add(Edge.make_bspline(
                [(16.755240937, -6.2066463042), (16.6552314343, -7.2494367288), (16.5812677523, -8.2881791115), (16.5172192351, -9.3254513944)],
                knots=[0.8021612393, 0.8021612393, 0.8021612393, 0.8021612393, 0.9255342605, 0.9255342605, 0.9255342605, 0.9255342605], degree=3))
            add(Edge.make_bspline(
                [(16.755240937, -6.2066463042), (16.4044399801, -7.4841944835), (16.053773505, -8.7729922694), (15.4340223068, -10.0539055119)],
                knots=[0, 0, 0, 0, 0.281908143, 0.281908143, 0.281908143, 0.281908143], degree=3))
        make_face()
    revolve(axis=Axis((0, 0, 5.9850515099), (0, 0, -1)))

    # F2 (on Front) → F3 (revolve)
    with BuildSketch(Plane.XZ):
        with BuildLine():
            add(Edge.make_bspline(
                [(12.7333556769, -18.7082347352), (12.7740238366, -18.7907127998), (12.8548636625, -18.9546620031), (12.7076612214, -19.0581256067), (12.634512037, -19.1095396876)],
                knots=[0, 0, 0, 0, 0.5030708471, 1, 1, 1, 1], degree=3))
            Line((12.7333556769, -18.7082347352), (12.634512037, -19.1095396876))
        make_face()
        with BuildLine():
            add(Edge.make_bspline(
                [(12.4912384255, -17.7732517499), (12.4659192386, -17.9335036999), (12.4138150114, -18.2632853804), (12.6248629774, -18.5571623933), (12.7333556769, -18.7082347352)],
                knots=[0, 0, 0, 0, 0.4859334508, 1, 1, 1, 1], degree=3))
            Line((12.7333556769, -18.7082347352), (12.9366270456, -17.8829534421))
            Line((12.9366270456, -17.8829534421), (12.4912384255, -17.7732517499))
        make_face()
        with BuildLine():
            Line((12.634512037, -19.1095396876), (12.7333556769, -18.7082347352))
            add(Edge.make_bspline(
                [(12.4912384255, -17.7732517499), (12.4659192386, -17.9335036999), (12.4138150114, -18.2632853804), (12.6248629774, -18.5571623933), (12.7333556769, -18.7082347352)],
                knots=[0, 0, 0, 0, 0.4859334508, 1, 1, 1, 1], degree=3))
            Line((12.4912384255, -17.7732517499), (12.3356003172, -17.7349172189))
            add(Edge.make_bspline(
                [(12.634512037, -19.1095396876), (12.4763407595, -18.8037343288), (12.2830712375, -18.0616036857), (12.3185150717, -17.8224569612), (12.3356003172, -17.7349172189)],
                knots=[0, 0, 0, 0, 0.6517513838, 1, 1, 1, 1], degree=3))
        make_face()
    revolve(axis=Axis((12.9386744507, 0, -17.8834577293), (-0.97098068, 0, 0.2391579373)))


solid = f1.part
